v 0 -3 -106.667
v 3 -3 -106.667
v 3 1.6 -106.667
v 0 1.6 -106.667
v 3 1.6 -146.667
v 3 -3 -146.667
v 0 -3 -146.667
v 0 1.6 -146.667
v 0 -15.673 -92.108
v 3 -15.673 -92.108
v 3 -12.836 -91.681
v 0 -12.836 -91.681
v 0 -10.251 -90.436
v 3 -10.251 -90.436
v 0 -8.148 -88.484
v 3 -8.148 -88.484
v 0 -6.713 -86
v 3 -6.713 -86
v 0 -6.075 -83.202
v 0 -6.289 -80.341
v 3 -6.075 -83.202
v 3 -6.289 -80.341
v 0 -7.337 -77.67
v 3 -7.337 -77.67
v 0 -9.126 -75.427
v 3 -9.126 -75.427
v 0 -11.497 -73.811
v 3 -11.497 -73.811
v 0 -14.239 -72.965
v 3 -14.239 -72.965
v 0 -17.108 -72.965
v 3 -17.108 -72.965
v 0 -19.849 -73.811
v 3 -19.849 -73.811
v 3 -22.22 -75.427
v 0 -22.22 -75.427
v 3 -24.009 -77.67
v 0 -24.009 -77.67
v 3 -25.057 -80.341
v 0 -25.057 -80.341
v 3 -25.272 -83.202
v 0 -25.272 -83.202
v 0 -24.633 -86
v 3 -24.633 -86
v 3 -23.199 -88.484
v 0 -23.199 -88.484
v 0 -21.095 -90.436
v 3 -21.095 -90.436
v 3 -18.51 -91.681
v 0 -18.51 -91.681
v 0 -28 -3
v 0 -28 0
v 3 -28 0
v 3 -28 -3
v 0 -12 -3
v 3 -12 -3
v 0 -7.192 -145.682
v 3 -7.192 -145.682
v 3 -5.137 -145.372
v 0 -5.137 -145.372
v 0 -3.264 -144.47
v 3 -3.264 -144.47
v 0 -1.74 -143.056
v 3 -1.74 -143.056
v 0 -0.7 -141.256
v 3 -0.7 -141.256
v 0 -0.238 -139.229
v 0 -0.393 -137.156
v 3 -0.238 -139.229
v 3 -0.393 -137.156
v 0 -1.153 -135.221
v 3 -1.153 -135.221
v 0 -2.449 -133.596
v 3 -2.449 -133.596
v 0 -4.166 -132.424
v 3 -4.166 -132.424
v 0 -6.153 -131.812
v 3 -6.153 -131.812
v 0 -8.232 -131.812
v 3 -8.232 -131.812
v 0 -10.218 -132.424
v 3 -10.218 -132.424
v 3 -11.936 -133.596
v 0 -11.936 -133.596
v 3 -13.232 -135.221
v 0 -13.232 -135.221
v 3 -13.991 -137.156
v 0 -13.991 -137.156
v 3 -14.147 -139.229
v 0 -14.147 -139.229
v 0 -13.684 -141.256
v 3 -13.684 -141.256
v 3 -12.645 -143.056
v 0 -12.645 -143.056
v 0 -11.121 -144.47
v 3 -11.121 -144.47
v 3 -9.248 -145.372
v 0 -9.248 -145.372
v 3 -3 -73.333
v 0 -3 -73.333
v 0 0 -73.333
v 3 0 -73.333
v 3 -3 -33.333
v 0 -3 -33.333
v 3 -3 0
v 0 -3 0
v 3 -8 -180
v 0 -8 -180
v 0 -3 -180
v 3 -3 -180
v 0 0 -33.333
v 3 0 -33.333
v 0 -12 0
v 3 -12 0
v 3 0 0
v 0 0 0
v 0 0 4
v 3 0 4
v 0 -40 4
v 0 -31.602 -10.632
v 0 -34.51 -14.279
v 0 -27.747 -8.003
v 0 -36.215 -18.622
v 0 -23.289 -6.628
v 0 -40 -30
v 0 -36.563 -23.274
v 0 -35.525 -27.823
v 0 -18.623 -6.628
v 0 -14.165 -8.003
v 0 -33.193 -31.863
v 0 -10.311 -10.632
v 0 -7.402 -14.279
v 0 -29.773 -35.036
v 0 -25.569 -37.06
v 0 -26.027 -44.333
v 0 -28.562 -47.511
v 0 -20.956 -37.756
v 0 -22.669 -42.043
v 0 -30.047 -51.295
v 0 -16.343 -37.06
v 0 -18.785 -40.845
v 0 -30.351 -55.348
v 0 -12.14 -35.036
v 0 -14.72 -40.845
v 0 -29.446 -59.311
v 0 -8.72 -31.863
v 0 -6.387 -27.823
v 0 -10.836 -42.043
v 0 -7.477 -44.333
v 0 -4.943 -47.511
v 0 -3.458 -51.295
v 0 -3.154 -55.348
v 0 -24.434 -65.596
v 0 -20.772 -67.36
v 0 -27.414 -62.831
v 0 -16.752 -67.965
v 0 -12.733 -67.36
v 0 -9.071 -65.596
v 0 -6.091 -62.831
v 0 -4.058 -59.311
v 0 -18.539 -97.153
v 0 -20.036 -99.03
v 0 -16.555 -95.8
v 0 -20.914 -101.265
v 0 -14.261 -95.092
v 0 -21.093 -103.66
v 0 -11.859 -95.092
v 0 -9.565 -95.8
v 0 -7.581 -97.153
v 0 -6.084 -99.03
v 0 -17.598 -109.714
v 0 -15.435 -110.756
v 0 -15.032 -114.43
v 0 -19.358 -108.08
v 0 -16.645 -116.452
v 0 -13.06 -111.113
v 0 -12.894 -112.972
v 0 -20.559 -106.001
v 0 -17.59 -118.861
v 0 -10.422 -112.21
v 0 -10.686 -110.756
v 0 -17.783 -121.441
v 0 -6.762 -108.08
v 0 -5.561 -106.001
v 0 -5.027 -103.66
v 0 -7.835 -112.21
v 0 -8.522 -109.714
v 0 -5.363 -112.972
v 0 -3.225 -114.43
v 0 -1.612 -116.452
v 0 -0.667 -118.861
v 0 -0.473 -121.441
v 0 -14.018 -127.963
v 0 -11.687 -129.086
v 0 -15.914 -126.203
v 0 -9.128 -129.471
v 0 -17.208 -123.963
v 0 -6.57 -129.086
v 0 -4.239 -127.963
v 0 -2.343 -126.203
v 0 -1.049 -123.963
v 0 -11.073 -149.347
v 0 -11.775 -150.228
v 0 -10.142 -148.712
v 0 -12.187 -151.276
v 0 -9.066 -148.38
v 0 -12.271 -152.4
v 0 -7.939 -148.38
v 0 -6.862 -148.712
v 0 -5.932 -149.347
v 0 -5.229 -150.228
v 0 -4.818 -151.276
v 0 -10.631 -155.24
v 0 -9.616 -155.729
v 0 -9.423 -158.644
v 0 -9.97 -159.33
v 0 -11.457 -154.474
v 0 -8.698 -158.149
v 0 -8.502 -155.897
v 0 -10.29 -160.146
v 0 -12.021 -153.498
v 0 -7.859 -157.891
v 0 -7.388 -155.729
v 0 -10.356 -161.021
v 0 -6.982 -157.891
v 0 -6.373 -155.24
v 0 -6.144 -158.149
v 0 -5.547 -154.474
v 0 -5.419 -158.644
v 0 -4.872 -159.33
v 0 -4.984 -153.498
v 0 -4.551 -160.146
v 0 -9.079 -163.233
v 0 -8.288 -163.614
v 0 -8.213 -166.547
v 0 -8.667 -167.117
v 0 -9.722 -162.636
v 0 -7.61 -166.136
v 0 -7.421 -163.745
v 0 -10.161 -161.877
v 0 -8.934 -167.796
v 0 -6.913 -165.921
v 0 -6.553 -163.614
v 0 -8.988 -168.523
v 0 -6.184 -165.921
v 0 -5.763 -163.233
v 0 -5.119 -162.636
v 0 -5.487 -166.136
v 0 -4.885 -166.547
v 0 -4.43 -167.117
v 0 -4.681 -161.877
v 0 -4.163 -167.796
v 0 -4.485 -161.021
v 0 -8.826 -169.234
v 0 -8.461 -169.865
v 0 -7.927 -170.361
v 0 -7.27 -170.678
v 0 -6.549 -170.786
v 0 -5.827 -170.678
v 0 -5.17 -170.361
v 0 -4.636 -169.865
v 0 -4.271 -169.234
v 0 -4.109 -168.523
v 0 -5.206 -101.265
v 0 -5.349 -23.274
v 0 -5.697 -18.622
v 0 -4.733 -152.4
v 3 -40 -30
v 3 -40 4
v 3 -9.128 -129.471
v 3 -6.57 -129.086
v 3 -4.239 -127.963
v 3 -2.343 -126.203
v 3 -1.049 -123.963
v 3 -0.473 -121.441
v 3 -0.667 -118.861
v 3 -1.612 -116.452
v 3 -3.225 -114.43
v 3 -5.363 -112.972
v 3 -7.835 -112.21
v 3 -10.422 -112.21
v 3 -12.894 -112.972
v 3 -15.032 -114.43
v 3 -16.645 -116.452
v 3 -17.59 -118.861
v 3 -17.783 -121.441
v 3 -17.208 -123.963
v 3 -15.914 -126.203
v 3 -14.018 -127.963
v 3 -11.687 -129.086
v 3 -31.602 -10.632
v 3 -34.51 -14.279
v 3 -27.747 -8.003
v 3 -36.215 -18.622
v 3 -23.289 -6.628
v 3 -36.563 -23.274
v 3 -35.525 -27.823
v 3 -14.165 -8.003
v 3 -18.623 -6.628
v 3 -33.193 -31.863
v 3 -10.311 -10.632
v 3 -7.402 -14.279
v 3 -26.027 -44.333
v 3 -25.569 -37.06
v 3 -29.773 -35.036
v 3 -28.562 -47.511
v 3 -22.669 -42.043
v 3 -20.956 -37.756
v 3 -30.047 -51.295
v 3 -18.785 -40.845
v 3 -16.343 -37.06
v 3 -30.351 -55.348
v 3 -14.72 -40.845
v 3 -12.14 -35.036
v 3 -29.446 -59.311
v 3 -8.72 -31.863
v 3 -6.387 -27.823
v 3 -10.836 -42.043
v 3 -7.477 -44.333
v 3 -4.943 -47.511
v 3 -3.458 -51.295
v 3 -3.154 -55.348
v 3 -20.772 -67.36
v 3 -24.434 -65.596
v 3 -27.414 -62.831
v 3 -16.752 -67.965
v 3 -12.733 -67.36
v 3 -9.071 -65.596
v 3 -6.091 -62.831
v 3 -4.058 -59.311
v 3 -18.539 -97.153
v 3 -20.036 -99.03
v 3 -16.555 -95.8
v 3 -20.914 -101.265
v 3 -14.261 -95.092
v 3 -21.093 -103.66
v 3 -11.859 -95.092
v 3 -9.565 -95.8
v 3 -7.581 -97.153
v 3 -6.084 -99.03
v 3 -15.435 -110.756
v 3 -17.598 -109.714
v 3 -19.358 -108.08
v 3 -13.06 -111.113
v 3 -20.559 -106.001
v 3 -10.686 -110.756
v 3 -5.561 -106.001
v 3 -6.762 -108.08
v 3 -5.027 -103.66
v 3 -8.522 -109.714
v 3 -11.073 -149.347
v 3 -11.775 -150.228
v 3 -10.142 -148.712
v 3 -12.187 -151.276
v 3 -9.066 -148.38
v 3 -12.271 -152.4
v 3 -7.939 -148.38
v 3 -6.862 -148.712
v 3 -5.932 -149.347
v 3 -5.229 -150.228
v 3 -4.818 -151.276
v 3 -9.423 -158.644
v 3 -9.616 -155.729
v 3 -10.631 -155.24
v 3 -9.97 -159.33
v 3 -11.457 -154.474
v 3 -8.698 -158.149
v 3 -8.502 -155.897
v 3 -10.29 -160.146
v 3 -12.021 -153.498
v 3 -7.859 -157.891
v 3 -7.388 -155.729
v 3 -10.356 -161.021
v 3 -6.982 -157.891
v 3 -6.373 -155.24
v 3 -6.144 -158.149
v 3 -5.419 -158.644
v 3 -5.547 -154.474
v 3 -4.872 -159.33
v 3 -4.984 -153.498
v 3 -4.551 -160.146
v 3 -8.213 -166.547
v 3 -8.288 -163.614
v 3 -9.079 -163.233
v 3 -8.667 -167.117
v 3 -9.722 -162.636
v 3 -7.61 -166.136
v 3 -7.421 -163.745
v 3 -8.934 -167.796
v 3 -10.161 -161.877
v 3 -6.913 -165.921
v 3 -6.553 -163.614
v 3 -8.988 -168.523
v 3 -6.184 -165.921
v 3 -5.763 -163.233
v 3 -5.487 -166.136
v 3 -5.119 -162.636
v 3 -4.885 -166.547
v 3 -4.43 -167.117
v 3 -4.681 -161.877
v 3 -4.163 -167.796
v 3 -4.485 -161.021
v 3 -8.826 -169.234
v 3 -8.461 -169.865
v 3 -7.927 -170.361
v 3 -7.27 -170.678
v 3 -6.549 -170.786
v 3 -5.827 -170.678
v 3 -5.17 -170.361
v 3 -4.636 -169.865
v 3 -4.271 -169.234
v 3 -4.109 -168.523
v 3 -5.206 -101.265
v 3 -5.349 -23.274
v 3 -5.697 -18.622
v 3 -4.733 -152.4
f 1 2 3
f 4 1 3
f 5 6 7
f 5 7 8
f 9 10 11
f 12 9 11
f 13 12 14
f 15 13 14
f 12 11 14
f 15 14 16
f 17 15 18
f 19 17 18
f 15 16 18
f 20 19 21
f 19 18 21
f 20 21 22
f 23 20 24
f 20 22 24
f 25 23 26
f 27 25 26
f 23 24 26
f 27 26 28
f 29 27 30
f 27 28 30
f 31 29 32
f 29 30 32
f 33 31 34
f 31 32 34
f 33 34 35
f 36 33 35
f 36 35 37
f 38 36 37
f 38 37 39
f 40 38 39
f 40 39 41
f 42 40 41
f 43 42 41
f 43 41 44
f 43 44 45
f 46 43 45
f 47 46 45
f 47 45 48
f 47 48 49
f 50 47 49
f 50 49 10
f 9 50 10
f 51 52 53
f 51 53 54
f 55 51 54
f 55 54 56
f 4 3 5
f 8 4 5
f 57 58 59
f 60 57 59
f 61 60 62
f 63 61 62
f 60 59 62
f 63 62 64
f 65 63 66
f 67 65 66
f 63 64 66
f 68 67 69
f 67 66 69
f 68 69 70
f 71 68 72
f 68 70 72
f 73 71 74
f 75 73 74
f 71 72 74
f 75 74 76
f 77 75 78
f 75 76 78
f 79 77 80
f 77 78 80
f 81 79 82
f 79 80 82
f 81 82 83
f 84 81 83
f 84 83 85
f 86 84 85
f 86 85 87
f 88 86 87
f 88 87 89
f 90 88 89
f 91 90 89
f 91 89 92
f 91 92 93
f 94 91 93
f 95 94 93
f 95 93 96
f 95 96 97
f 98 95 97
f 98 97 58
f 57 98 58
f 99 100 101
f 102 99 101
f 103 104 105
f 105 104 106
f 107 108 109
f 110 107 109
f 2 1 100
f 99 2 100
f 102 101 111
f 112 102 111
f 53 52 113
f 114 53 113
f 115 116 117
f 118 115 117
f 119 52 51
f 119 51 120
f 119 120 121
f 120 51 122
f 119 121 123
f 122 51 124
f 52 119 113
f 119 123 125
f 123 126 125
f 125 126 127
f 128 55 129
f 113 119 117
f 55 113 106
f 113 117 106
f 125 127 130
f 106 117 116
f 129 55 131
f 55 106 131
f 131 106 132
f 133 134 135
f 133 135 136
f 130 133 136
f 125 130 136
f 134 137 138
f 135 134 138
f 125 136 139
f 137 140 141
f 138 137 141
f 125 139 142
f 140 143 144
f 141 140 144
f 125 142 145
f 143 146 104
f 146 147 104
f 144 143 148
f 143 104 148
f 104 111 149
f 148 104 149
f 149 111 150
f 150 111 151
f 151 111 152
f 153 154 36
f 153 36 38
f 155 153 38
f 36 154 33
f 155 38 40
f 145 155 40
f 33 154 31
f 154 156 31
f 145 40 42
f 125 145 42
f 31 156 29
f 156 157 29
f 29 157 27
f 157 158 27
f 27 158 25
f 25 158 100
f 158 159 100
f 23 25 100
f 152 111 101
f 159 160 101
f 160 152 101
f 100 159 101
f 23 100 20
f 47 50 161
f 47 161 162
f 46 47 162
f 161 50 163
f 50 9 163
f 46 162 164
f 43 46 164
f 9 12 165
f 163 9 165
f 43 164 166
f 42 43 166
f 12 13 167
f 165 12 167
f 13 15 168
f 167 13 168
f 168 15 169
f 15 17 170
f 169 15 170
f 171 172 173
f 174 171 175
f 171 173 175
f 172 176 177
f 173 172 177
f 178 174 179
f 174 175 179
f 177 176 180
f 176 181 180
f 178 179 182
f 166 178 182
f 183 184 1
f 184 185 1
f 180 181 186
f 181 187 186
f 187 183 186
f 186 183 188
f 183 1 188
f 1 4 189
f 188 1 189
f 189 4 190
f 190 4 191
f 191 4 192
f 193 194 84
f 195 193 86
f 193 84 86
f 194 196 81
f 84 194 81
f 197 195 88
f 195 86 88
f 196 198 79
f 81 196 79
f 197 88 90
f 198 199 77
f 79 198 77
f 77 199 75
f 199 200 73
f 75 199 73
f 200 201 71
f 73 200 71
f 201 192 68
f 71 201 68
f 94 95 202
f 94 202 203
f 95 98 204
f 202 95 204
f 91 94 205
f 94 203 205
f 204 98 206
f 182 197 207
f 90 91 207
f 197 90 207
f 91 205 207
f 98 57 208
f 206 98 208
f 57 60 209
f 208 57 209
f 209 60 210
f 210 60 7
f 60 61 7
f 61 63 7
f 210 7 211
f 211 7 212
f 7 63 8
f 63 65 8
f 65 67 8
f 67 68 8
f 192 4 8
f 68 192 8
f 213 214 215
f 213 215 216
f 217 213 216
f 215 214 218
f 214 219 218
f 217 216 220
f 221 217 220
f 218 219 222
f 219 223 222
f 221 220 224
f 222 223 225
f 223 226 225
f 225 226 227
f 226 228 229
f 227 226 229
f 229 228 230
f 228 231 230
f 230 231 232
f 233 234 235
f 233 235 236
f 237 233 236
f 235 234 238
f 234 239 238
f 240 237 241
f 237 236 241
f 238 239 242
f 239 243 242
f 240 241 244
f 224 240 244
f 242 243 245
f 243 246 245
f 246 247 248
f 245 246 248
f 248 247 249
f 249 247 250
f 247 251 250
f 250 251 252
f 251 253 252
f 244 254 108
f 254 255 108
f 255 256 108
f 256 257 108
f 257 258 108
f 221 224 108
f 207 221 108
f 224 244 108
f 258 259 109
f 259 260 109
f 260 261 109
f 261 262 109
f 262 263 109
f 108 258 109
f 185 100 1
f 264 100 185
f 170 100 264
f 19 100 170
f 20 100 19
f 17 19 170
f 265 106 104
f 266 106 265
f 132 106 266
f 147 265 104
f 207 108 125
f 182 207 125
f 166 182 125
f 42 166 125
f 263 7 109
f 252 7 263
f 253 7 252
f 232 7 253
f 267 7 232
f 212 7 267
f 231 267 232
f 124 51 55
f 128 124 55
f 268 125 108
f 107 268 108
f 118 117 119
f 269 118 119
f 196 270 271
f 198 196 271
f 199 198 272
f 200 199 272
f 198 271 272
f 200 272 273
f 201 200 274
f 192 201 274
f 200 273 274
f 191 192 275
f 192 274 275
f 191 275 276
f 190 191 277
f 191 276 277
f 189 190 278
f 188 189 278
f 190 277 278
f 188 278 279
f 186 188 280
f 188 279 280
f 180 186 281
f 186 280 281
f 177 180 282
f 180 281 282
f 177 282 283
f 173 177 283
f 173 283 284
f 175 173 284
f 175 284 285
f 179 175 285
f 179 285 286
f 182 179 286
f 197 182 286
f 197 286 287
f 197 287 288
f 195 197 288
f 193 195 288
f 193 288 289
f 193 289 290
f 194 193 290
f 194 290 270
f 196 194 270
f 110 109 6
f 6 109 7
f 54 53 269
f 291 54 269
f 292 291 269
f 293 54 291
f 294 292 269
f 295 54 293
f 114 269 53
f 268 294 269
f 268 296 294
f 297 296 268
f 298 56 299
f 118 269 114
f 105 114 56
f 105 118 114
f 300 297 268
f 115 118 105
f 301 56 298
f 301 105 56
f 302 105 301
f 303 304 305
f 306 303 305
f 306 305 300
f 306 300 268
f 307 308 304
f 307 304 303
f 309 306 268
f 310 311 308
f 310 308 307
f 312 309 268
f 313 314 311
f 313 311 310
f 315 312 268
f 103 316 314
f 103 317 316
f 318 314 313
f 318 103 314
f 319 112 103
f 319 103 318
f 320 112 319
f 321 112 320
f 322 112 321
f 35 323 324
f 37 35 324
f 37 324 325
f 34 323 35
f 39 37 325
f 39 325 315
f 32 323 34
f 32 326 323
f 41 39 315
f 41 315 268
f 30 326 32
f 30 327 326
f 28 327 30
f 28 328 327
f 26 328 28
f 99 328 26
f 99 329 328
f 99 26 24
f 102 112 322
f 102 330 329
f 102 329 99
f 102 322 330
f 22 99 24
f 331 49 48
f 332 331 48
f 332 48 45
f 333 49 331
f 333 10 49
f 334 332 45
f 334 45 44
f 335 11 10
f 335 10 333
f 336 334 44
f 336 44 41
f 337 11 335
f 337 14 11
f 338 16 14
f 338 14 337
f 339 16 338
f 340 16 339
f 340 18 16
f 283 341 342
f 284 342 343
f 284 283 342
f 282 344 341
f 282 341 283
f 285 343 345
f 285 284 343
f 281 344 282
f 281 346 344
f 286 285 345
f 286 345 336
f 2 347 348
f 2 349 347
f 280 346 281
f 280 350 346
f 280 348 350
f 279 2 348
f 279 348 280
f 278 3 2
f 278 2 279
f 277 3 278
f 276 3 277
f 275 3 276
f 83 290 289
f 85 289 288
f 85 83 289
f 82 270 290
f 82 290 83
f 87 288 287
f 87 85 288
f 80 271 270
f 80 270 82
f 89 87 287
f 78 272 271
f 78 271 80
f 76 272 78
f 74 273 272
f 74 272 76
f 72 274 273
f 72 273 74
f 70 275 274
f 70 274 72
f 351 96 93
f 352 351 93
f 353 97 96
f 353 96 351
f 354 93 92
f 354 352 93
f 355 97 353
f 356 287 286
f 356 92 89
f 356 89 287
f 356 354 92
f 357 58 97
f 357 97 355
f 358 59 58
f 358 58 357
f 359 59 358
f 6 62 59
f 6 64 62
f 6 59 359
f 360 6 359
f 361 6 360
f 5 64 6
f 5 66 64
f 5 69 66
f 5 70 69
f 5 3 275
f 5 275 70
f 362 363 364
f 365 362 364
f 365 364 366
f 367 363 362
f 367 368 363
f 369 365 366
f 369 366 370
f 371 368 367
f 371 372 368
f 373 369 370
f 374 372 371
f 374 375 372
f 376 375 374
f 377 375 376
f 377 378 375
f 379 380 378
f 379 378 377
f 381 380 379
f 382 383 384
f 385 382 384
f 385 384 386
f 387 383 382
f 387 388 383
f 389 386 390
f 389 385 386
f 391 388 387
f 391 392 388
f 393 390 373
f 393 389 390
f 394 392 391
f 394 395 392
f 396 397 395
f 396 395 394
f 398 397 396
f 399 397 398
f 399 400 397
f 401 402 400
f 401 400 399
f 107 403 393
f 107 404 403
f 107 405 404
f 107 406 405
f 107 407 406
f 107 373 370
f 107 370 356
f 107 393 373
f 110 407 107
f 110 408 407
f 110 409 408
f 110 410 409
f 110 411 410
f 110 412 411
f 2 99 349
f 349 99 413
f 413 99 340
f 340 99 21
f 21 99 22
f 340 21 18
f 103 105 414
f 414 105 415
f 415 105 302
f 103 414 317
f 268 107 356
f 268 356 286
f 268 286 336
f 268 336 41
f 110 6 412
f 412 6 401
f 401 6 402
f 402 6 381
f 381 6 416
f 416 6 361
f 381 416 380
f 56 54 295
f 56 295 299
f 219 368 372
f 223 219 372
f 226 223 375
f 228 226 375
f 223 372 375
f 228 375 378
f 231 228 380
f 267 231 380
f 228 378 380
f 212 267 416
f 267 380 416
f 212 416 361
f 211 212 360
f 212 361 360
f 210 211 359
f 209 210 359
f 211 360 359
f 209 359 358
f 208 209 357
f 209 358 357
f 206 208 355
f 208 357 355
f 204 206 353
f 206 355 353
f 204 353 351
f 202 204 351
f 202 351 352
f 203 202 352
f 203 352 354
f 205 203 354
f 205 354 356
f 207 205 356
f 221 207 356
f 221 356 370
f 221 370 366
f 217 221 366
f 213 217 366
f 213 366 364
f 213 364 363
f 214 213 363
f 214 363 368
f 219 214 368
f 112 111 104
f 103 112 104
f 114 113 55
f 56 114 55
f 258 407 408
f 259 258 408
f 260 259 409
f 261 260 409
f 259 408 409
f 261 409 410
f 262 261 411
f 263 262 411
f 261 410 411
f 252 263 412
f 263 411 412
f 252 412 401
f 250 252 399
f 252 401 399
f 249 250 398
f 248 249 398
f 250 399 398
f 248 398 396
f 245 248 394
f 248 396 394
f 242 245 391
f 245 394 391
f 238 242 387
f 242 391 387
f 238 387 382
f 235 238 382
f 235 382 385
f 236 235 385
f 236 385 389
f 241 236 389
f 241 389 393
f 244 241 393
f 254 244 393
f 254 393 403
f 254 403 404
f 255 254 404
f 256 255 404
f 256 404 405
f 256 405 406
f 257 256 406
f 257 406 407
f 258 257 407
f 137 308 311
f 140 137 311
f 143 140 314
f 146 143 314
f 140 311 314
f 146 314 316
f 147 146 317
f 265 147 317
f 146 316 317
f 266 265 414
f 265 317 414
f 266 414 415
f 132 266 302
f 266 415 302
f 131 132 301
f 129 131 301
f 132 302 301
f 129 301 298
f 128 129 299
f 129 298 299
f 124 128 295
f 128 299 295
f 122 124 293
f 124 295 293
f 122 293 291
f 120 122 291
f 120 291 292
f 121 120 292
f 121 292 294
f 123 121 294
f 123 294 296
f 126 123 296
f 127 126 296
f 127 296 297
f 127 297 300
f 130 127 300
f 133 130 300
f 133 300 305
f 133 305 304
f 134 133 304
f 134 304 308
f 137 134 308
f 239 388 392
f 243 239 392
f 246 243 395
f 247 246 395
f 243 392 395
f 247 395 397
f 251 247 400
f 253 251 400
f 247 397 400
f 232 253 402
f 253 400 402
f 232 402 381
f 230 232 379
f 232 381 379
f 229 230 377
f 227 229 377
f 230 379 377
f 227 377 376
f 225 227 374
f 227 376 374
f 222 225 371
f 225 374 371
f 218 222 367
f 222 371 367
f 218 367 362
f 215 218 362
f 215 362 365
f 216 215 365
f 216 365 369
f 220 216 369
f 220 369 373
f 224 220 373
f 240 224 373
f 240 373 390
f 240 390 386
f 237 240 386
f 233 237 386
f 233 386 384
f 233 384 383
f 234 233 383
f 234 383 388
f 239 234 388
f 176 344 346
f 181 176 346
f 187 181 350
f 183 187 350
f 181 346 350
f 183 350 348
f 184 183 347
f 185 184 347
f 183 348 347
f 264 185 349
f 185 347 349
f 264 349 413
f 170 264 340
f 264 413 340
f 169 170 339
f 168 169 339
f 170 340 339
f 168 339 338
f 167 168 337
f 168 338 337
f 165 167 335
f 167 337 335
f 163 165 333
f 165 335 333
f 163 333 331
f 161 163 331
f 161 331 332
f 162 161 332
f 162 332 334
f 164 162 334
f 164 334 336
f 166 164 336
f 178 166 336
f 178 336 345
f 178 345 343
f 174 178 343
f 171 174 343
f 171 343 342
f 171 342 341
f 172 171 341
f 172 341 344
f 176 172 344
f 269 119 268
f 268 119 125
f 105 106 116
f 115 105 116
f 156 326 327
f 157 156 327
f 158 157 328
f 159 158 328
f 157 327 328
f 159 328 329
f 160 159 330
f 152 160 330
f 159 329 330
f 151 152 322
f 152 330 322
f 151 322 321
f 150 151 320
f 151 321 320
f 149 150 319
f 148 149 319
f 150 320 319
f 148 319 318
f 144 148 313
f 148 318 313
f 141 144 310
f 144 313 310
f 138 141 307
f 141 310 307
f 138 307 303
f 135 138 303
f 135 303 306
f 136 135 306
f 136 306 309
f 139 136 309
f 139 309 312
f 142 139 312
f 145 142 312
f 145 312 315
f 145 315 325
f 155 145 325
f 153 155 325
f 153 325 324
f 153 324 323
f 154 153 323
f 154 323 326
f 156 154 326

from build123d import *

# Parameters (mm, degrees)
SKETCH1_W           = 3
SKETCH1_H           = 16
BOSS_EXTRUDE1_DEPTH = 3
SKETCH2_W           = 40
SKETCH2_H           = 1.6
BOSS_EXTRUDE2_DEPTH = 3
SKETCH3_R           = 15.651050508
SKETCH3_R_2         = 13.636404617
SKETCH3_R_3         = 9.625367155
SKETCH3_R_4         = 8.055659383
SKETCH3_R_5         = 8.6792975
SKETCH3_R_6         = 6.974005881
SKETCH3_R_7         = 2.446418815
SKETCH3_R_8         = 3.779523595
SKETCH3_R_9         = 2.94345793
CUT_EXTRUDE1_DEPTH  = 10


with BuildPart() as part:
    # Sketch1 → Boss-Extrude1 (new body)
    with BuildSketch(Plane(origin=(0, 0, 0), x_dir=(0, 0, -1), z_dir=(1, 0, 0))):
        Polygon((30, -40), (180, -8), (180, -3), (146.666666667, -3), (146.666666667, 0), (106.666666667, 0), (106.666666667, -3), (73.333333333, -3), (73.333333333, 0), (33.333333333, 0), (33.333333333, -3), (0, -3), (0, 0), (-4, 0), (-4, -40), (0, -40), align=None)
        with Locations((1.5, -20)):
            Rectangle(SKETCH1_W, SKETCH1_H, mode=Mode.SUBTRACT)
    extrude(amount=BOSS_EXTRUDE1_DEPTH)

    # Sketch2 → Boss-Extrude2 (add)
    with BuildSketch(Plane(origin=(3, 0, 0), x_dir=(0, 0, -1), z_dir=(1, 0, 0))):
        with Locations((126.666666667, 0.8)):
            Rectangle(SKETCH2_W, SKETCH2_H)
    extrude(amount=-BOSS_EXTRUDE2_DEPTH)

    # Sketch3 → Cut-Extrude1 (cut)
    with BuildSketch(Plane(origin=(3, 0, 0), x_dir=(0, 0, -1), z_dir=(1, 0, 0))):
        with Locations((22.104563443, -20.956095071)):
            Circle(SKETCH3_R)
        with Locations((54.328943076, -16.752253971)):
            Circle(SKETCH3_R_2)
        with Locations((82.483117774, -15.673188709)):
            Circle(SKETCH3_R_3)
        with Locations((103.057816826, -13.060067591)):
            Circle(SKETCH3_R_4)
        with Locations((120.792027676, -9.128318411)):
            Circle(SKETCH3_R_5)
        with Locations((138.707850434, -7.192260379)):
            Circle(SKETCH3_R_6)
        with Locations((168.340077715, -6.548539538)):
            Circle(SKETCH3_R_7)
        with Locations((152.117415019, -8.502294699)):
            Circle(SKETCH3_R_8)
        with Locations((160.801244487, -7.420684272)):
            Circle(SKETCH3_R_9)
    extrude(amount=-CUT_EXTRUDE1_DEPTH, mode=Mode.SUBTRACT)


solid = part.part
